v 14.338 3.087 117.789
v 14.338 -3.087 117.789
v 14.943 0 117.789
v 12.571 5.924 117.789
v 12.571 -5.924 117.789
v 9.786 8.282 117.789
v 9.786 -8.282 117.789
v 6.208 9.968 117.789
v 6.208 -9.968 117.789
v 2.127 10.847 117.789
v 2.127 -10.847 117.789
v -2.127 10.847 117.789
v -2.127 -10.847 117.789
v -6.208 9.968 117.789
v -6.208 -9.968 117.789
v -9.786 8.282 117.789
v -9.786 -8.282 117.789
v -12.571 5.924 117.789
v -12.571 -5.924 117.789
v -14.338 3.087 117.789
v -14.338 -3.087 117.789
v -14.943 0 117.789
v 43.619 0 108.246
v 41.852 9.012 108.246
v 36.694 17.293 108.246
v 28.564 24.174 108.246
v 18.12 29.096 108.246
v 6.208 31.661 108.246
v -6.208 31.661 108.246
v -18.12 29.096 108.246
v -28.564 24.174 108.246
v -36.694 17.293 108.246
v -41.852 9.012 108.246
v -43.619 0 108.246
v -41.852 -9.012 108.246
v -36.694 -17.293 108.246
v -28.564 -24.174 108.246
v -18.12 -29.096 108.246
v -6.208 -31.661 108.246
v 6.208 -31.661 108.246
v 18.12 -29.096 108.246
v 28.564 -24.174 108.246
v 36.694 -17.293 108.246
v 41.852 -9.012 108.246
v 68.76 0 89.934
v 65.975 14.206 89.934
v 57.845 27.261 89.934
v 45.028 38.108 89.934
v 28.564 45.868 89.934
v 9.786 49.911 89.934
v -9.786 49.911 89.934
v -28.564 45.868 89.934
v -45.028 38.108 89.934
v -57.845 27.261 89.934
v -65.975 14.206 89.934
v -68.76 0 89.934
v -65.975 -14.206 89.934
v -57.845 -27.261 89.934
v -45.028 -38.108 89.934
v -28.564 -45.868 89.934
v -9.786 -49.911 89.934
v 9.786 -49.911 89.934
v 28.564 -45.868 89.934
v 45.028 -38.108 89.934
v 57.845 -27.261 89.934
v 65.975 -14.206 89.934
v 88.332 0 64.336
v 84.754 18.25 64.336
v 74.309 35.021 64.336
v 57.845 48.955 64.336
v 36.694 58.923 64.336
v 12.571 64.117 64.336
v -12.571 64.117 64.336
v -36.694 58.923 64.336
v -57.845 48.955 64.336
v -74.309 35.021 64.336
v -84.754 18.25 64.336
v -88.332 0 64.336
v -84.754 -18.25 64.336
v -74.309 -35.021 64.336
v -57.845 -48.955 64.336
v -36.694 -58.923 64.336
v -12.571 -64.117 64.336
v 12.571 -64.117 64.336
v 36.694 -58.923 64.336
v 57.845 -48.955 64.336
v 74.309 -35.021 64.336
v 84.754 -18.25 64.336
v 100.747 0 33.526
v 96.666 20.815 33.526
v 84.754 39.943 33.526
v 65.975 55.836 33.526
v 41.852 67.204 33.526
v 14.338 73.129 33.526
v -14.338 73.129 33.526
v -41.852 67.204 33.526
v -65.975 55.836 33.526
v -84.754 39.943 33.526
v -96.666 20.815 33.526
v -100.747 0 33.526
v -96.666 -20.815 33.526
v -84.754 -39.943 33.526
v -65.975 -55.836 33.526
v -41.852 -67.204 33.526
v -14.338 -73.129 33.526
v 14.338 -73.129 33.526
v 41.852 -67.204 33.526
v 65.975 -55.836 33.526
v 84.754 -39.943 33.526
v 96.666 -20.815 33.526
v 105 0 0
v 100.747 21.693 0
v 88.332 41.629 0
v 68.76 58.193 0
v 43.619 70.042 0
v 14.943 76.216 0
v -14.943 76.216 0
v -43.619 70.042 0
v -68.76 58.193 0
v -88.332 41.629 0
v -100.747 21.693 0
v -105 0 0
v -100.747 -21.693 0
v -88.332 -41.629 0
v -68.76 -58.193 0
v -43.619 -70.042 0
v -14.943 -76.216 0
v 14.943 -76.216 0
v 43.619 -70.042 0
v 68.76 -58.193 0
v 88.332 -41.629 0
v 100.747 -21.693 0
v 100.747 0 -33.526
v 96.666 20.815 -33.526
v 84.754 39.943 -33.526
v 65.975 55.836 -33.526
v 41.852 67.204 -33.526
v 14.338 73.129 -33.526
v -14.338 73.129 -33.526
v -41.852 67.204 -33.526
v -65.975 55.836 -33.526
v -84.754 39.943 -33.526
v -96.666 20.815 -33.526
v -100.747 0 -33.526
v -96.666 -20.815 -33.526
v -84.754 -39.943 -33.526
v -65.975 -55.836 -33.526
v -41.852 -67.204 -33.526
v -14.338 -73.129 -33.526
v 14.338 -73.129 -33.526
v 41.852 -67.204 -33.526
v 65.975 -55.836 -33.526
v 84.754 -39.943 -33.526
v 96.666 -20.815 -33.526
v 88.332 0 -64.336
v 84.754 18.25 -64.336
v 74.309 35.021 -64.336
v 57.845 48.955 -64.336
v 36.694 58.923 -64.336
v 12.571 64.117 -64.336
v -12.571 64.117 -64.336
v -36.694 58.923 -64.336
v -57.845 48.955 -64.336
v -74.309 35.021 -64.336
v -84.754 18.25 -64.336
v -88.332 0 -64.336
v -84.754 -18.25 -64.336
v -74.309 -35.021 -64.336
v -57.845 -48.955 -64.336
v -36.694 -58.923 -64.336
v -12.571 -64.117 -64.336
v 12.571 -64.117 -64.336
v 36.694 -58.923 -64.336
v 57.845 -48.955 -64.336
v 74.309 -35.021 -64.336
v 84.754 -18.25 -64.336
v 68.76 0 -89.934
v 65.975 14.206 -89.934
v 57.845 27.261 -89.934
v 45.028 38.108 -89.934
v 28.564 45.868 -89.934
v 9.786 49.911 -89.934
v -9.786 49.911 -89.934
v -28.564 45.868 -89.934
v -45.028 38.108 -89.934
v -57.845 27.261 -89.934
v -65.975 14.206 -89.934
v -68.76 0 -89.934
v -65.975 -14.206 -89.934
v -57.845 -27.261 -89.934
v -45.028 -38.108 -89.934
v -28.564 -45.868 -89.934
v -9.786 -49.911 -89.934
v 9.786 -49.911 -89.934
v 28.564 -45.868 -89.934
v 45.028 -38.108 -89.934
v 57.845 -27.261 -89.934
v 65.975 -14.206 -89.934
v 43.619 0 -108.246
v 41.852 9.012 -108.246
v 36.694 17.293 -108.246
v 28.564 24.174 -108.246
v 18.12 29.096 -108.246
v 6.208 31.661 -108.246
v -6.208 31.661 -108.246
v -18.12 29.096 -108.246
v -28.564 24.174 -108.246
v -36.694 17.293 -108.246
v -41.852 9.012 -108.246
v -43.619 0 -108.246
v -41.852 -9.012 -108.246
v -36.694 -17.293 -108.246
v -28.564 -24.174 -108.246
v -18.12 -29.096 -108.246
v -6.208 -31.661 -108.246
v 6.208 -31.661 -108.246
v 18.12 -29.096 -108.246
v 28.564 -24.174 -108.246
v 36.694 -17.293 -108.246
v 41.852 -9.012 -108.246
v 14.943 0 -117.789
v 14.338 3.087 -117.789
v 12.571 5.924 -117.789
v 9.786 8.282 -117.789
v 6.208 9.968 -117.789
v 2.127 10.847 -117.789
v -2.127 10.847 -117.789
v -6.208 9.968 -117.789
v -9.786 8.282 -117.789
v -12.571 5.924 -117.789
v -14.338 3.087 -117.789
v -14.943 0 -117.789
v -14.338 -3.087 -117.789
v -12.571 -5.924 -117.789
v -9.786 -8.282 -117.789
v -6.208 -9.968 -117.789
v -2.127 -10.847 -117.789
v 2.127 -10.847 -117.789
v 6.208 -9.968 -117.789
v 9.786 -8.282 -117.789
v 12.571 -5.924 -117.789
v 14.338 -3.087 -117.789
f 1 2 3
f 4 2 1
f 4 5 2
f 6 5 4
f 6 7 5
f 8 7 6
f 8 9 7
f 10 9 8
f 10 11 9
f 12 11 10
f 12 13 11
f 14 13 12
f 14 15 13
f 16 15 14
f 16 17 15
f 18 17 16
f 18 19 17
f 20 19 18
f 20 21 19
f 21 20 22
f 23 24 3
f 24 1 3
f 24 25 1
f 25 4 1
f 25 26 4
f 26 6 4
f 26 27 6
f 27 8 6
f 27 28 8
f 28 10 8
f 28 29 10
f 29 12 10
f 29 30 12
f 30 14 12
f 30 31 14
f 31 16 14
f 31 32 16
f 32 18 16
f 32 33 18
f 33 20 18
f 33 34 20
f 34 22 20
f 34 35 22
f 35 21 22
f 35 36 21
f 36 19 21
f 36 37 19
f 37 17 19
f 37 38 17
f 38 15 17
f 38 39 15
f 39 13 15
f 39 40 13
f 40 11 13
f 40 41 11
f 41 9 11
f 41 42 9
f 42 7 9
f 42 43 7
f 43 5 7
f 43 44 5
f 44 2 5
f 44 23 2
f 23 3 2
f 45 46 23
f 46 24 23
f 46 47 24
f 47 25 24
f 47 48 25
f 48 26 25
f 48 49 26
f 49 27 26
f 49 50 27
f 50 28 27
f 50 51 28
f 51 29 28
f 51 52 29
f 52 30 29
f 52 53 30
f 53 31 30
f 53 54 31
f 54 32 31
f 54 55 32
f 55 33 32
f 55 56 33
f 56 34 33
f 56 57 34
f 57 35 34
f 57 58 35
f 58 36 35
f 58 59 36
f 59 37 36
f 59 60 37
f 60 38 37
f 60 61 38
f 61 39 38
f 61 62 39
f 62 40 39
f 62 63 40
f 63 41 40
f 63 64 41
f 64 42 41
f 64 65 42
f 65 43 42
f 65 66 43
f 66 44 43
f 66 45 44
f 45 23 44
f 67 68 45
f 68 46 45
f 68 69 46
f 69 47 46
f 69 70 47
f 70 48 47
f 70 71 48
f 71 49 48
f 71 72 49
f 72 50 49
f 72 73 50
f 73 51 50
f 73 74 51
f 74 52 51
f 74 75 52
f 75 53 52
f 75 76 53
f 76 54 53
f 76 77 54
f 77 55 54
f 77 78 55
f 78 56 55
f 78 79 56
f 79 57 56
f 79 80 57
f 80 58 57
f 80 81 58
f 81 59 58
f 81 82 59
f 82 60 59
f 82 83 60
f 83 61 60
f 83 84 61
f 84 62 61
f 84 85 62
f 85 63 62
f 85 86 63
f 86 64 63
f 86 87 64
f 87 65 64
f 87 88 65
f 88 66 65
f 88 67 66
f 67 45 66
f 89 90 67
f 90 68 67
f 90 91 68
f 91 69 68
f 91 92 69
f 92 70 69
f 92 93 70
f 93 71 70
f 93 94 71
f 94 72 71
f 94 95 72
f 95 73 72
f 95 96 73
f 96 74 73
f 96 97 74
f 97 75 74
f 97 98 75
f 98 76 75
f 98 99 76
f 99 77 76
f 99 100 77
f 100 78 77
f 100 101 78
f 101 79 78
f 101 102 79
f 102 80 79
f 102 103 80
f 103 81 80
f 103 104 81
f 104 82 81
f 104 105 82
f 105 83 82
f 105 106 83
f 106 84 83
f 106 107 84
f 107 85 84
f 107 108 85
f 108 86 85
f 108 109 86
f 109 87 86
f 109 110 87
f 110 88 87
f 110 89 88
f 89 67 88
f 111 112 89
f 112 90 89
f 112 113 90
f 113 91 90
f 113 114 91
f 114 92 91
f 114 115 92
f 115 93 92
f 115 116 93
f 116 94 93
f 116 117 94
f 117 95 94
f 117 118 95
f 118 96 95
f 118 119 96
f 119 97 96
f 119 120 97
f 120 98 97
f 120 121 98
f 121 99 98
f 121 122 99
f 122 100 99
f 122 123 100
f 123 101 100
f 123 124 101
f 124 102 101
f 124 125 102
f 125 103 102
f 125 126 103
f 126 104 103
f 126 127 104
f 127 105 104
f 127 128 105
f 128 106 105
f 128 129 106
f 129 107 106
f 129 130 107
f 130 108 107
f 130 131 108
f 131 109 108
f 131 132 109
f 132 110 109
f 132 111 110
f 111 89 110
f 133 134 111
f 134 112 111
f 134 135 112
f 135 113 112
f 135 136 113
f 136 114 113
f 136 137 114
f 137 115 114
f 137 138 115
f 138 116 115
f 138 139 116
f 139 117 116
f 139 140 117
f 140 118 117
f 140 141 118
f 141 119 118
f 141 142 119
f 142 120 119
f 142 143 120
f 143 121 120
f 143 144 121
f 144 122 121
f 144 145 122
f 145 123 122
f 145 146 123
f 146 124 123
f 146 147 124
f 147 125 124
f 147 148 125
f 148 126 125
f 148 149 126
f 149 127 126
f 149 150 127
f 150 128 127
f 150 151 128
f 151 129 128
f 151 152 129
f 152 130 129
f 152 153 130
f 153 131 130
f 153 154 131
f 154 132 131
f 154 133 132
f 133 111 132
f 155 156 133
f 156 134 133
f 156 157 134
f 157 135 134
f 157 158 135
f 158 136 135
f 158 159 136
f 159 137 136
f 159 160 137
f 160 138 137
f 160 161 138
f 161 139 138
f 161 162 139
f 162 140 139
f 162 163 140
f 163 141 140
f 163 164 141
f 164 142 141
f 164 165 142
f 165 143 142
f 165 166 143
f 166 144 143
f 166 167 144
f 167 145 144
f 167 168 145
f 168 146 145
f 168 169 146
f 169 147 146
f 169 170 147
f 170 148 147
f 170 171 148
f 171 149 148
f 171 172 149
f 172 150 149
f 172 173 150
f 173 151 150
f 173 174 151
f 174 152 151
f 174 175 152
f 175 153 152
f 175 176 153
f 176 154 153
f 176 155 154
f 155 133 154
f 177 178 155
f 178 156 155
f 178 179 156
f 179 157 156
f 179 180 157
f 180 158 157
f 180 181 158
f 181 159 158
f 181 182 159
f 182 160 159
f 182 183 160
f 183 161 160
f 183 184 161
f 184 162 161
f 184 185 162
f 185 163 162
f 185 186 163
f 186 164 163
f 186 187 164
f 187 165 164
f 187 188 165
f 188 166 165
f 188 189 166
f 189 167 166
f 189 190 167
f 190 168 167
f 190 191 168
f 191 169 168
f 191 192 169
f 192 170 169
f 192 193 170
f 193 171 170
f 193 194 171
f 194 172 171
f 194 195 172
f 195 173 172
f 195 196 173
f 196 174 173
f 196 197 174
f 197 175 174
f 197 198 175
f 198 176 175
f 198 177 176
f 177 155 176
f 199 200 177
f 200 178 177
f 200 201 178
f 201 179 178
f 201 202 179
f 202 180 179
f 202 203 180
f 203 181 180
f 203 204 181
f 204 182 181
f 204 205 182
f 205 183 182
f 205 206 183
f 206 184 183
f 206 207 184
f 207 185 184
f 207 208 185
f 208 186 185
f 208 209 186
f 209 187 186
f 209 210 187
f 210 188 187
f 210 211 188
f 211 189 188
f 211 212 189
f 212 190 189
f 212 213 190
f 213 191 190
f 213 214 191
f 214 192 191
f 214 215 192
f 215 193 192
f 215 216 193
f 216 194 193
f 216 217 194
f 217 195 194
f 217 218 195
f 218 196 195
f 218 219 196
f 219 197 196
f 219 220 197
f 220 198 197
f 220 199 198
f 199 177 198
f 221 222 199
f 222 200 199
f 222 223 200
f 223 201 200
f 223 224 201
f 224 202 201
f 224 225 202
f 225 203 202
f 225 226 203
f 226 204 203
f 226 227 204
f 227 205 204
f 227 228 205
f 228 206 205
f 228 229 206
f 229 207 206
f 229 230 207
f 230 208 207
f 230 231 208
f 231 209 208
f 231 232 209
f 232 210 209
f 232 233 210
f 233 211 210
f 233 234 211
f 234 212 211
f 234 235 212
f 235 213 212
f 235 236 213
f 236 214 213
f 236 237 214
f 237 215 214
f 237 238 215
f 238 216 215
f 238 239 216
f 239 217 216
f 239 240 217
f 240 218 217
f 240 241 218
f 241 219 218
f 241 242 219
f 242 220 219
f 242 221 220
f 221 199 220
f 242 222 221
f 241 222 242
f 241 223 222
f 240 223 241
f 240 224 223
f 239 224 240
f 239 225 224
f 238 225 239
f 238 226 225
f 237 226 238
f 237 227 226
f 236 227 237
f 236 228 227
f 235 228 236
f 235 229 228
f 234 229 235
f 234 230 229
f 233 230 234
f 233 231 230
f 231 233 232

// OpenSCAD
// Generated by SolidPython 1.0.1 on 2020-07-29 00:46:52


scale(v = [15, 11, 17]) {
	sphere(r = 7);
}
/***********************************************
*********      SolidPython code:      **********
************************************************
 
# import packages: SolidPython
from solid import *
from solid.utils import *
from itertools import chain, combinations, permutations


class Resize:

    def __init__(self, scad_file):
        self.scad_file = scad_file
        #self.scad_file = import_scad(scad_file)
        # cone/cylinder param:
        self.r1 = 0
        self.r2 = 0
        self.h = 0
        # rectangular prism param:
        self.w = 0
        self.l = 0
        # ellipse param:
        self.r = 0

    # import OpenScad code (file name corresponds to shape)


    # classify shape + parameters
    def assign(self, param1, param2, param3):
        if self.scad_file == 'cone.scad':
            self.r1 = param1
            self.r2 = param2
            self.h = param3
        elif self.scad_file == 'cylinder.scad':
            self.r1 = param1
            self.r2 = param2
            self.h = param3
        elif self.scad_file == 'rectangularPrism.scad':
            self.h = param1
            self.l = param2
            self.w = param3
        else:
            self.r = param1
            self.h = param2

    # resize parameters
    def iterate(self):
        x = range(3, 20, 2)
        i = 1
        if self.scad_file == 'cone.scad':
            tempList = list(permutations(x, 2))
            for temp in tempList:
                param1 = temp[0]
                param2 = temp[1]
                filepath = 'produced_scad_files/' + 'cone' + str(param1) + '_' + str(param2) + '_' + '.scad'
                scad_render_to_file(cylinder(h=param1, r1=param2, r2=0), filepath)

        elif self.scad_file == 'cylinder.scad':
            tempList = list(permutations(x, 3))
            for temp in tempList:
                param1 = temp[0]
                param2 = temp[1]
                filepath = 'produced_scad_files/' + 'cylinder' + str(param1) + '_' + str(param2) + '_' + '.scad'
                scad_render_to_file(cylinder(h=param1, r1=param2, r2=param2), filepath)

        elif self.scad_file == 'rectangularPrism.scad':
            tempList = list(permutations(x, 3))
            for temp in tempList:
                param1 = temp[0]
                param2 = temp[1]
                param3 = temp[2]
                filepath = 'produced_scad_files/' + 'rectangularPrism' + str(param1) + '_' + str(param2) + '_' + str(
                    param3) + '.scad'
                scad_render_to_file(cube(size=(param1, param2, param3)), filepath)

        elif self.scad_file == 'ellipse.scad':
            tempList = list(permutations(x, 4))
            for temp in tempList:
                param1 = temp[0]
                param2 = temp[1]
                param3 = temp[2]
                param4 = temp[3]
                filepath = 'produced_scad_files/' + 'ellipse' + str(param1) + '_' + str(param2) + '_' + str(param3) + '_' + str(param4) + '.scad'
                scad_render_to_file(scale([param1, param2, param3])(sphere(r=param4)), filepath)

    def render_to_scadfile(self):
        scad_render_to_file(scad, 'example.scad') 
 
************************************************/
